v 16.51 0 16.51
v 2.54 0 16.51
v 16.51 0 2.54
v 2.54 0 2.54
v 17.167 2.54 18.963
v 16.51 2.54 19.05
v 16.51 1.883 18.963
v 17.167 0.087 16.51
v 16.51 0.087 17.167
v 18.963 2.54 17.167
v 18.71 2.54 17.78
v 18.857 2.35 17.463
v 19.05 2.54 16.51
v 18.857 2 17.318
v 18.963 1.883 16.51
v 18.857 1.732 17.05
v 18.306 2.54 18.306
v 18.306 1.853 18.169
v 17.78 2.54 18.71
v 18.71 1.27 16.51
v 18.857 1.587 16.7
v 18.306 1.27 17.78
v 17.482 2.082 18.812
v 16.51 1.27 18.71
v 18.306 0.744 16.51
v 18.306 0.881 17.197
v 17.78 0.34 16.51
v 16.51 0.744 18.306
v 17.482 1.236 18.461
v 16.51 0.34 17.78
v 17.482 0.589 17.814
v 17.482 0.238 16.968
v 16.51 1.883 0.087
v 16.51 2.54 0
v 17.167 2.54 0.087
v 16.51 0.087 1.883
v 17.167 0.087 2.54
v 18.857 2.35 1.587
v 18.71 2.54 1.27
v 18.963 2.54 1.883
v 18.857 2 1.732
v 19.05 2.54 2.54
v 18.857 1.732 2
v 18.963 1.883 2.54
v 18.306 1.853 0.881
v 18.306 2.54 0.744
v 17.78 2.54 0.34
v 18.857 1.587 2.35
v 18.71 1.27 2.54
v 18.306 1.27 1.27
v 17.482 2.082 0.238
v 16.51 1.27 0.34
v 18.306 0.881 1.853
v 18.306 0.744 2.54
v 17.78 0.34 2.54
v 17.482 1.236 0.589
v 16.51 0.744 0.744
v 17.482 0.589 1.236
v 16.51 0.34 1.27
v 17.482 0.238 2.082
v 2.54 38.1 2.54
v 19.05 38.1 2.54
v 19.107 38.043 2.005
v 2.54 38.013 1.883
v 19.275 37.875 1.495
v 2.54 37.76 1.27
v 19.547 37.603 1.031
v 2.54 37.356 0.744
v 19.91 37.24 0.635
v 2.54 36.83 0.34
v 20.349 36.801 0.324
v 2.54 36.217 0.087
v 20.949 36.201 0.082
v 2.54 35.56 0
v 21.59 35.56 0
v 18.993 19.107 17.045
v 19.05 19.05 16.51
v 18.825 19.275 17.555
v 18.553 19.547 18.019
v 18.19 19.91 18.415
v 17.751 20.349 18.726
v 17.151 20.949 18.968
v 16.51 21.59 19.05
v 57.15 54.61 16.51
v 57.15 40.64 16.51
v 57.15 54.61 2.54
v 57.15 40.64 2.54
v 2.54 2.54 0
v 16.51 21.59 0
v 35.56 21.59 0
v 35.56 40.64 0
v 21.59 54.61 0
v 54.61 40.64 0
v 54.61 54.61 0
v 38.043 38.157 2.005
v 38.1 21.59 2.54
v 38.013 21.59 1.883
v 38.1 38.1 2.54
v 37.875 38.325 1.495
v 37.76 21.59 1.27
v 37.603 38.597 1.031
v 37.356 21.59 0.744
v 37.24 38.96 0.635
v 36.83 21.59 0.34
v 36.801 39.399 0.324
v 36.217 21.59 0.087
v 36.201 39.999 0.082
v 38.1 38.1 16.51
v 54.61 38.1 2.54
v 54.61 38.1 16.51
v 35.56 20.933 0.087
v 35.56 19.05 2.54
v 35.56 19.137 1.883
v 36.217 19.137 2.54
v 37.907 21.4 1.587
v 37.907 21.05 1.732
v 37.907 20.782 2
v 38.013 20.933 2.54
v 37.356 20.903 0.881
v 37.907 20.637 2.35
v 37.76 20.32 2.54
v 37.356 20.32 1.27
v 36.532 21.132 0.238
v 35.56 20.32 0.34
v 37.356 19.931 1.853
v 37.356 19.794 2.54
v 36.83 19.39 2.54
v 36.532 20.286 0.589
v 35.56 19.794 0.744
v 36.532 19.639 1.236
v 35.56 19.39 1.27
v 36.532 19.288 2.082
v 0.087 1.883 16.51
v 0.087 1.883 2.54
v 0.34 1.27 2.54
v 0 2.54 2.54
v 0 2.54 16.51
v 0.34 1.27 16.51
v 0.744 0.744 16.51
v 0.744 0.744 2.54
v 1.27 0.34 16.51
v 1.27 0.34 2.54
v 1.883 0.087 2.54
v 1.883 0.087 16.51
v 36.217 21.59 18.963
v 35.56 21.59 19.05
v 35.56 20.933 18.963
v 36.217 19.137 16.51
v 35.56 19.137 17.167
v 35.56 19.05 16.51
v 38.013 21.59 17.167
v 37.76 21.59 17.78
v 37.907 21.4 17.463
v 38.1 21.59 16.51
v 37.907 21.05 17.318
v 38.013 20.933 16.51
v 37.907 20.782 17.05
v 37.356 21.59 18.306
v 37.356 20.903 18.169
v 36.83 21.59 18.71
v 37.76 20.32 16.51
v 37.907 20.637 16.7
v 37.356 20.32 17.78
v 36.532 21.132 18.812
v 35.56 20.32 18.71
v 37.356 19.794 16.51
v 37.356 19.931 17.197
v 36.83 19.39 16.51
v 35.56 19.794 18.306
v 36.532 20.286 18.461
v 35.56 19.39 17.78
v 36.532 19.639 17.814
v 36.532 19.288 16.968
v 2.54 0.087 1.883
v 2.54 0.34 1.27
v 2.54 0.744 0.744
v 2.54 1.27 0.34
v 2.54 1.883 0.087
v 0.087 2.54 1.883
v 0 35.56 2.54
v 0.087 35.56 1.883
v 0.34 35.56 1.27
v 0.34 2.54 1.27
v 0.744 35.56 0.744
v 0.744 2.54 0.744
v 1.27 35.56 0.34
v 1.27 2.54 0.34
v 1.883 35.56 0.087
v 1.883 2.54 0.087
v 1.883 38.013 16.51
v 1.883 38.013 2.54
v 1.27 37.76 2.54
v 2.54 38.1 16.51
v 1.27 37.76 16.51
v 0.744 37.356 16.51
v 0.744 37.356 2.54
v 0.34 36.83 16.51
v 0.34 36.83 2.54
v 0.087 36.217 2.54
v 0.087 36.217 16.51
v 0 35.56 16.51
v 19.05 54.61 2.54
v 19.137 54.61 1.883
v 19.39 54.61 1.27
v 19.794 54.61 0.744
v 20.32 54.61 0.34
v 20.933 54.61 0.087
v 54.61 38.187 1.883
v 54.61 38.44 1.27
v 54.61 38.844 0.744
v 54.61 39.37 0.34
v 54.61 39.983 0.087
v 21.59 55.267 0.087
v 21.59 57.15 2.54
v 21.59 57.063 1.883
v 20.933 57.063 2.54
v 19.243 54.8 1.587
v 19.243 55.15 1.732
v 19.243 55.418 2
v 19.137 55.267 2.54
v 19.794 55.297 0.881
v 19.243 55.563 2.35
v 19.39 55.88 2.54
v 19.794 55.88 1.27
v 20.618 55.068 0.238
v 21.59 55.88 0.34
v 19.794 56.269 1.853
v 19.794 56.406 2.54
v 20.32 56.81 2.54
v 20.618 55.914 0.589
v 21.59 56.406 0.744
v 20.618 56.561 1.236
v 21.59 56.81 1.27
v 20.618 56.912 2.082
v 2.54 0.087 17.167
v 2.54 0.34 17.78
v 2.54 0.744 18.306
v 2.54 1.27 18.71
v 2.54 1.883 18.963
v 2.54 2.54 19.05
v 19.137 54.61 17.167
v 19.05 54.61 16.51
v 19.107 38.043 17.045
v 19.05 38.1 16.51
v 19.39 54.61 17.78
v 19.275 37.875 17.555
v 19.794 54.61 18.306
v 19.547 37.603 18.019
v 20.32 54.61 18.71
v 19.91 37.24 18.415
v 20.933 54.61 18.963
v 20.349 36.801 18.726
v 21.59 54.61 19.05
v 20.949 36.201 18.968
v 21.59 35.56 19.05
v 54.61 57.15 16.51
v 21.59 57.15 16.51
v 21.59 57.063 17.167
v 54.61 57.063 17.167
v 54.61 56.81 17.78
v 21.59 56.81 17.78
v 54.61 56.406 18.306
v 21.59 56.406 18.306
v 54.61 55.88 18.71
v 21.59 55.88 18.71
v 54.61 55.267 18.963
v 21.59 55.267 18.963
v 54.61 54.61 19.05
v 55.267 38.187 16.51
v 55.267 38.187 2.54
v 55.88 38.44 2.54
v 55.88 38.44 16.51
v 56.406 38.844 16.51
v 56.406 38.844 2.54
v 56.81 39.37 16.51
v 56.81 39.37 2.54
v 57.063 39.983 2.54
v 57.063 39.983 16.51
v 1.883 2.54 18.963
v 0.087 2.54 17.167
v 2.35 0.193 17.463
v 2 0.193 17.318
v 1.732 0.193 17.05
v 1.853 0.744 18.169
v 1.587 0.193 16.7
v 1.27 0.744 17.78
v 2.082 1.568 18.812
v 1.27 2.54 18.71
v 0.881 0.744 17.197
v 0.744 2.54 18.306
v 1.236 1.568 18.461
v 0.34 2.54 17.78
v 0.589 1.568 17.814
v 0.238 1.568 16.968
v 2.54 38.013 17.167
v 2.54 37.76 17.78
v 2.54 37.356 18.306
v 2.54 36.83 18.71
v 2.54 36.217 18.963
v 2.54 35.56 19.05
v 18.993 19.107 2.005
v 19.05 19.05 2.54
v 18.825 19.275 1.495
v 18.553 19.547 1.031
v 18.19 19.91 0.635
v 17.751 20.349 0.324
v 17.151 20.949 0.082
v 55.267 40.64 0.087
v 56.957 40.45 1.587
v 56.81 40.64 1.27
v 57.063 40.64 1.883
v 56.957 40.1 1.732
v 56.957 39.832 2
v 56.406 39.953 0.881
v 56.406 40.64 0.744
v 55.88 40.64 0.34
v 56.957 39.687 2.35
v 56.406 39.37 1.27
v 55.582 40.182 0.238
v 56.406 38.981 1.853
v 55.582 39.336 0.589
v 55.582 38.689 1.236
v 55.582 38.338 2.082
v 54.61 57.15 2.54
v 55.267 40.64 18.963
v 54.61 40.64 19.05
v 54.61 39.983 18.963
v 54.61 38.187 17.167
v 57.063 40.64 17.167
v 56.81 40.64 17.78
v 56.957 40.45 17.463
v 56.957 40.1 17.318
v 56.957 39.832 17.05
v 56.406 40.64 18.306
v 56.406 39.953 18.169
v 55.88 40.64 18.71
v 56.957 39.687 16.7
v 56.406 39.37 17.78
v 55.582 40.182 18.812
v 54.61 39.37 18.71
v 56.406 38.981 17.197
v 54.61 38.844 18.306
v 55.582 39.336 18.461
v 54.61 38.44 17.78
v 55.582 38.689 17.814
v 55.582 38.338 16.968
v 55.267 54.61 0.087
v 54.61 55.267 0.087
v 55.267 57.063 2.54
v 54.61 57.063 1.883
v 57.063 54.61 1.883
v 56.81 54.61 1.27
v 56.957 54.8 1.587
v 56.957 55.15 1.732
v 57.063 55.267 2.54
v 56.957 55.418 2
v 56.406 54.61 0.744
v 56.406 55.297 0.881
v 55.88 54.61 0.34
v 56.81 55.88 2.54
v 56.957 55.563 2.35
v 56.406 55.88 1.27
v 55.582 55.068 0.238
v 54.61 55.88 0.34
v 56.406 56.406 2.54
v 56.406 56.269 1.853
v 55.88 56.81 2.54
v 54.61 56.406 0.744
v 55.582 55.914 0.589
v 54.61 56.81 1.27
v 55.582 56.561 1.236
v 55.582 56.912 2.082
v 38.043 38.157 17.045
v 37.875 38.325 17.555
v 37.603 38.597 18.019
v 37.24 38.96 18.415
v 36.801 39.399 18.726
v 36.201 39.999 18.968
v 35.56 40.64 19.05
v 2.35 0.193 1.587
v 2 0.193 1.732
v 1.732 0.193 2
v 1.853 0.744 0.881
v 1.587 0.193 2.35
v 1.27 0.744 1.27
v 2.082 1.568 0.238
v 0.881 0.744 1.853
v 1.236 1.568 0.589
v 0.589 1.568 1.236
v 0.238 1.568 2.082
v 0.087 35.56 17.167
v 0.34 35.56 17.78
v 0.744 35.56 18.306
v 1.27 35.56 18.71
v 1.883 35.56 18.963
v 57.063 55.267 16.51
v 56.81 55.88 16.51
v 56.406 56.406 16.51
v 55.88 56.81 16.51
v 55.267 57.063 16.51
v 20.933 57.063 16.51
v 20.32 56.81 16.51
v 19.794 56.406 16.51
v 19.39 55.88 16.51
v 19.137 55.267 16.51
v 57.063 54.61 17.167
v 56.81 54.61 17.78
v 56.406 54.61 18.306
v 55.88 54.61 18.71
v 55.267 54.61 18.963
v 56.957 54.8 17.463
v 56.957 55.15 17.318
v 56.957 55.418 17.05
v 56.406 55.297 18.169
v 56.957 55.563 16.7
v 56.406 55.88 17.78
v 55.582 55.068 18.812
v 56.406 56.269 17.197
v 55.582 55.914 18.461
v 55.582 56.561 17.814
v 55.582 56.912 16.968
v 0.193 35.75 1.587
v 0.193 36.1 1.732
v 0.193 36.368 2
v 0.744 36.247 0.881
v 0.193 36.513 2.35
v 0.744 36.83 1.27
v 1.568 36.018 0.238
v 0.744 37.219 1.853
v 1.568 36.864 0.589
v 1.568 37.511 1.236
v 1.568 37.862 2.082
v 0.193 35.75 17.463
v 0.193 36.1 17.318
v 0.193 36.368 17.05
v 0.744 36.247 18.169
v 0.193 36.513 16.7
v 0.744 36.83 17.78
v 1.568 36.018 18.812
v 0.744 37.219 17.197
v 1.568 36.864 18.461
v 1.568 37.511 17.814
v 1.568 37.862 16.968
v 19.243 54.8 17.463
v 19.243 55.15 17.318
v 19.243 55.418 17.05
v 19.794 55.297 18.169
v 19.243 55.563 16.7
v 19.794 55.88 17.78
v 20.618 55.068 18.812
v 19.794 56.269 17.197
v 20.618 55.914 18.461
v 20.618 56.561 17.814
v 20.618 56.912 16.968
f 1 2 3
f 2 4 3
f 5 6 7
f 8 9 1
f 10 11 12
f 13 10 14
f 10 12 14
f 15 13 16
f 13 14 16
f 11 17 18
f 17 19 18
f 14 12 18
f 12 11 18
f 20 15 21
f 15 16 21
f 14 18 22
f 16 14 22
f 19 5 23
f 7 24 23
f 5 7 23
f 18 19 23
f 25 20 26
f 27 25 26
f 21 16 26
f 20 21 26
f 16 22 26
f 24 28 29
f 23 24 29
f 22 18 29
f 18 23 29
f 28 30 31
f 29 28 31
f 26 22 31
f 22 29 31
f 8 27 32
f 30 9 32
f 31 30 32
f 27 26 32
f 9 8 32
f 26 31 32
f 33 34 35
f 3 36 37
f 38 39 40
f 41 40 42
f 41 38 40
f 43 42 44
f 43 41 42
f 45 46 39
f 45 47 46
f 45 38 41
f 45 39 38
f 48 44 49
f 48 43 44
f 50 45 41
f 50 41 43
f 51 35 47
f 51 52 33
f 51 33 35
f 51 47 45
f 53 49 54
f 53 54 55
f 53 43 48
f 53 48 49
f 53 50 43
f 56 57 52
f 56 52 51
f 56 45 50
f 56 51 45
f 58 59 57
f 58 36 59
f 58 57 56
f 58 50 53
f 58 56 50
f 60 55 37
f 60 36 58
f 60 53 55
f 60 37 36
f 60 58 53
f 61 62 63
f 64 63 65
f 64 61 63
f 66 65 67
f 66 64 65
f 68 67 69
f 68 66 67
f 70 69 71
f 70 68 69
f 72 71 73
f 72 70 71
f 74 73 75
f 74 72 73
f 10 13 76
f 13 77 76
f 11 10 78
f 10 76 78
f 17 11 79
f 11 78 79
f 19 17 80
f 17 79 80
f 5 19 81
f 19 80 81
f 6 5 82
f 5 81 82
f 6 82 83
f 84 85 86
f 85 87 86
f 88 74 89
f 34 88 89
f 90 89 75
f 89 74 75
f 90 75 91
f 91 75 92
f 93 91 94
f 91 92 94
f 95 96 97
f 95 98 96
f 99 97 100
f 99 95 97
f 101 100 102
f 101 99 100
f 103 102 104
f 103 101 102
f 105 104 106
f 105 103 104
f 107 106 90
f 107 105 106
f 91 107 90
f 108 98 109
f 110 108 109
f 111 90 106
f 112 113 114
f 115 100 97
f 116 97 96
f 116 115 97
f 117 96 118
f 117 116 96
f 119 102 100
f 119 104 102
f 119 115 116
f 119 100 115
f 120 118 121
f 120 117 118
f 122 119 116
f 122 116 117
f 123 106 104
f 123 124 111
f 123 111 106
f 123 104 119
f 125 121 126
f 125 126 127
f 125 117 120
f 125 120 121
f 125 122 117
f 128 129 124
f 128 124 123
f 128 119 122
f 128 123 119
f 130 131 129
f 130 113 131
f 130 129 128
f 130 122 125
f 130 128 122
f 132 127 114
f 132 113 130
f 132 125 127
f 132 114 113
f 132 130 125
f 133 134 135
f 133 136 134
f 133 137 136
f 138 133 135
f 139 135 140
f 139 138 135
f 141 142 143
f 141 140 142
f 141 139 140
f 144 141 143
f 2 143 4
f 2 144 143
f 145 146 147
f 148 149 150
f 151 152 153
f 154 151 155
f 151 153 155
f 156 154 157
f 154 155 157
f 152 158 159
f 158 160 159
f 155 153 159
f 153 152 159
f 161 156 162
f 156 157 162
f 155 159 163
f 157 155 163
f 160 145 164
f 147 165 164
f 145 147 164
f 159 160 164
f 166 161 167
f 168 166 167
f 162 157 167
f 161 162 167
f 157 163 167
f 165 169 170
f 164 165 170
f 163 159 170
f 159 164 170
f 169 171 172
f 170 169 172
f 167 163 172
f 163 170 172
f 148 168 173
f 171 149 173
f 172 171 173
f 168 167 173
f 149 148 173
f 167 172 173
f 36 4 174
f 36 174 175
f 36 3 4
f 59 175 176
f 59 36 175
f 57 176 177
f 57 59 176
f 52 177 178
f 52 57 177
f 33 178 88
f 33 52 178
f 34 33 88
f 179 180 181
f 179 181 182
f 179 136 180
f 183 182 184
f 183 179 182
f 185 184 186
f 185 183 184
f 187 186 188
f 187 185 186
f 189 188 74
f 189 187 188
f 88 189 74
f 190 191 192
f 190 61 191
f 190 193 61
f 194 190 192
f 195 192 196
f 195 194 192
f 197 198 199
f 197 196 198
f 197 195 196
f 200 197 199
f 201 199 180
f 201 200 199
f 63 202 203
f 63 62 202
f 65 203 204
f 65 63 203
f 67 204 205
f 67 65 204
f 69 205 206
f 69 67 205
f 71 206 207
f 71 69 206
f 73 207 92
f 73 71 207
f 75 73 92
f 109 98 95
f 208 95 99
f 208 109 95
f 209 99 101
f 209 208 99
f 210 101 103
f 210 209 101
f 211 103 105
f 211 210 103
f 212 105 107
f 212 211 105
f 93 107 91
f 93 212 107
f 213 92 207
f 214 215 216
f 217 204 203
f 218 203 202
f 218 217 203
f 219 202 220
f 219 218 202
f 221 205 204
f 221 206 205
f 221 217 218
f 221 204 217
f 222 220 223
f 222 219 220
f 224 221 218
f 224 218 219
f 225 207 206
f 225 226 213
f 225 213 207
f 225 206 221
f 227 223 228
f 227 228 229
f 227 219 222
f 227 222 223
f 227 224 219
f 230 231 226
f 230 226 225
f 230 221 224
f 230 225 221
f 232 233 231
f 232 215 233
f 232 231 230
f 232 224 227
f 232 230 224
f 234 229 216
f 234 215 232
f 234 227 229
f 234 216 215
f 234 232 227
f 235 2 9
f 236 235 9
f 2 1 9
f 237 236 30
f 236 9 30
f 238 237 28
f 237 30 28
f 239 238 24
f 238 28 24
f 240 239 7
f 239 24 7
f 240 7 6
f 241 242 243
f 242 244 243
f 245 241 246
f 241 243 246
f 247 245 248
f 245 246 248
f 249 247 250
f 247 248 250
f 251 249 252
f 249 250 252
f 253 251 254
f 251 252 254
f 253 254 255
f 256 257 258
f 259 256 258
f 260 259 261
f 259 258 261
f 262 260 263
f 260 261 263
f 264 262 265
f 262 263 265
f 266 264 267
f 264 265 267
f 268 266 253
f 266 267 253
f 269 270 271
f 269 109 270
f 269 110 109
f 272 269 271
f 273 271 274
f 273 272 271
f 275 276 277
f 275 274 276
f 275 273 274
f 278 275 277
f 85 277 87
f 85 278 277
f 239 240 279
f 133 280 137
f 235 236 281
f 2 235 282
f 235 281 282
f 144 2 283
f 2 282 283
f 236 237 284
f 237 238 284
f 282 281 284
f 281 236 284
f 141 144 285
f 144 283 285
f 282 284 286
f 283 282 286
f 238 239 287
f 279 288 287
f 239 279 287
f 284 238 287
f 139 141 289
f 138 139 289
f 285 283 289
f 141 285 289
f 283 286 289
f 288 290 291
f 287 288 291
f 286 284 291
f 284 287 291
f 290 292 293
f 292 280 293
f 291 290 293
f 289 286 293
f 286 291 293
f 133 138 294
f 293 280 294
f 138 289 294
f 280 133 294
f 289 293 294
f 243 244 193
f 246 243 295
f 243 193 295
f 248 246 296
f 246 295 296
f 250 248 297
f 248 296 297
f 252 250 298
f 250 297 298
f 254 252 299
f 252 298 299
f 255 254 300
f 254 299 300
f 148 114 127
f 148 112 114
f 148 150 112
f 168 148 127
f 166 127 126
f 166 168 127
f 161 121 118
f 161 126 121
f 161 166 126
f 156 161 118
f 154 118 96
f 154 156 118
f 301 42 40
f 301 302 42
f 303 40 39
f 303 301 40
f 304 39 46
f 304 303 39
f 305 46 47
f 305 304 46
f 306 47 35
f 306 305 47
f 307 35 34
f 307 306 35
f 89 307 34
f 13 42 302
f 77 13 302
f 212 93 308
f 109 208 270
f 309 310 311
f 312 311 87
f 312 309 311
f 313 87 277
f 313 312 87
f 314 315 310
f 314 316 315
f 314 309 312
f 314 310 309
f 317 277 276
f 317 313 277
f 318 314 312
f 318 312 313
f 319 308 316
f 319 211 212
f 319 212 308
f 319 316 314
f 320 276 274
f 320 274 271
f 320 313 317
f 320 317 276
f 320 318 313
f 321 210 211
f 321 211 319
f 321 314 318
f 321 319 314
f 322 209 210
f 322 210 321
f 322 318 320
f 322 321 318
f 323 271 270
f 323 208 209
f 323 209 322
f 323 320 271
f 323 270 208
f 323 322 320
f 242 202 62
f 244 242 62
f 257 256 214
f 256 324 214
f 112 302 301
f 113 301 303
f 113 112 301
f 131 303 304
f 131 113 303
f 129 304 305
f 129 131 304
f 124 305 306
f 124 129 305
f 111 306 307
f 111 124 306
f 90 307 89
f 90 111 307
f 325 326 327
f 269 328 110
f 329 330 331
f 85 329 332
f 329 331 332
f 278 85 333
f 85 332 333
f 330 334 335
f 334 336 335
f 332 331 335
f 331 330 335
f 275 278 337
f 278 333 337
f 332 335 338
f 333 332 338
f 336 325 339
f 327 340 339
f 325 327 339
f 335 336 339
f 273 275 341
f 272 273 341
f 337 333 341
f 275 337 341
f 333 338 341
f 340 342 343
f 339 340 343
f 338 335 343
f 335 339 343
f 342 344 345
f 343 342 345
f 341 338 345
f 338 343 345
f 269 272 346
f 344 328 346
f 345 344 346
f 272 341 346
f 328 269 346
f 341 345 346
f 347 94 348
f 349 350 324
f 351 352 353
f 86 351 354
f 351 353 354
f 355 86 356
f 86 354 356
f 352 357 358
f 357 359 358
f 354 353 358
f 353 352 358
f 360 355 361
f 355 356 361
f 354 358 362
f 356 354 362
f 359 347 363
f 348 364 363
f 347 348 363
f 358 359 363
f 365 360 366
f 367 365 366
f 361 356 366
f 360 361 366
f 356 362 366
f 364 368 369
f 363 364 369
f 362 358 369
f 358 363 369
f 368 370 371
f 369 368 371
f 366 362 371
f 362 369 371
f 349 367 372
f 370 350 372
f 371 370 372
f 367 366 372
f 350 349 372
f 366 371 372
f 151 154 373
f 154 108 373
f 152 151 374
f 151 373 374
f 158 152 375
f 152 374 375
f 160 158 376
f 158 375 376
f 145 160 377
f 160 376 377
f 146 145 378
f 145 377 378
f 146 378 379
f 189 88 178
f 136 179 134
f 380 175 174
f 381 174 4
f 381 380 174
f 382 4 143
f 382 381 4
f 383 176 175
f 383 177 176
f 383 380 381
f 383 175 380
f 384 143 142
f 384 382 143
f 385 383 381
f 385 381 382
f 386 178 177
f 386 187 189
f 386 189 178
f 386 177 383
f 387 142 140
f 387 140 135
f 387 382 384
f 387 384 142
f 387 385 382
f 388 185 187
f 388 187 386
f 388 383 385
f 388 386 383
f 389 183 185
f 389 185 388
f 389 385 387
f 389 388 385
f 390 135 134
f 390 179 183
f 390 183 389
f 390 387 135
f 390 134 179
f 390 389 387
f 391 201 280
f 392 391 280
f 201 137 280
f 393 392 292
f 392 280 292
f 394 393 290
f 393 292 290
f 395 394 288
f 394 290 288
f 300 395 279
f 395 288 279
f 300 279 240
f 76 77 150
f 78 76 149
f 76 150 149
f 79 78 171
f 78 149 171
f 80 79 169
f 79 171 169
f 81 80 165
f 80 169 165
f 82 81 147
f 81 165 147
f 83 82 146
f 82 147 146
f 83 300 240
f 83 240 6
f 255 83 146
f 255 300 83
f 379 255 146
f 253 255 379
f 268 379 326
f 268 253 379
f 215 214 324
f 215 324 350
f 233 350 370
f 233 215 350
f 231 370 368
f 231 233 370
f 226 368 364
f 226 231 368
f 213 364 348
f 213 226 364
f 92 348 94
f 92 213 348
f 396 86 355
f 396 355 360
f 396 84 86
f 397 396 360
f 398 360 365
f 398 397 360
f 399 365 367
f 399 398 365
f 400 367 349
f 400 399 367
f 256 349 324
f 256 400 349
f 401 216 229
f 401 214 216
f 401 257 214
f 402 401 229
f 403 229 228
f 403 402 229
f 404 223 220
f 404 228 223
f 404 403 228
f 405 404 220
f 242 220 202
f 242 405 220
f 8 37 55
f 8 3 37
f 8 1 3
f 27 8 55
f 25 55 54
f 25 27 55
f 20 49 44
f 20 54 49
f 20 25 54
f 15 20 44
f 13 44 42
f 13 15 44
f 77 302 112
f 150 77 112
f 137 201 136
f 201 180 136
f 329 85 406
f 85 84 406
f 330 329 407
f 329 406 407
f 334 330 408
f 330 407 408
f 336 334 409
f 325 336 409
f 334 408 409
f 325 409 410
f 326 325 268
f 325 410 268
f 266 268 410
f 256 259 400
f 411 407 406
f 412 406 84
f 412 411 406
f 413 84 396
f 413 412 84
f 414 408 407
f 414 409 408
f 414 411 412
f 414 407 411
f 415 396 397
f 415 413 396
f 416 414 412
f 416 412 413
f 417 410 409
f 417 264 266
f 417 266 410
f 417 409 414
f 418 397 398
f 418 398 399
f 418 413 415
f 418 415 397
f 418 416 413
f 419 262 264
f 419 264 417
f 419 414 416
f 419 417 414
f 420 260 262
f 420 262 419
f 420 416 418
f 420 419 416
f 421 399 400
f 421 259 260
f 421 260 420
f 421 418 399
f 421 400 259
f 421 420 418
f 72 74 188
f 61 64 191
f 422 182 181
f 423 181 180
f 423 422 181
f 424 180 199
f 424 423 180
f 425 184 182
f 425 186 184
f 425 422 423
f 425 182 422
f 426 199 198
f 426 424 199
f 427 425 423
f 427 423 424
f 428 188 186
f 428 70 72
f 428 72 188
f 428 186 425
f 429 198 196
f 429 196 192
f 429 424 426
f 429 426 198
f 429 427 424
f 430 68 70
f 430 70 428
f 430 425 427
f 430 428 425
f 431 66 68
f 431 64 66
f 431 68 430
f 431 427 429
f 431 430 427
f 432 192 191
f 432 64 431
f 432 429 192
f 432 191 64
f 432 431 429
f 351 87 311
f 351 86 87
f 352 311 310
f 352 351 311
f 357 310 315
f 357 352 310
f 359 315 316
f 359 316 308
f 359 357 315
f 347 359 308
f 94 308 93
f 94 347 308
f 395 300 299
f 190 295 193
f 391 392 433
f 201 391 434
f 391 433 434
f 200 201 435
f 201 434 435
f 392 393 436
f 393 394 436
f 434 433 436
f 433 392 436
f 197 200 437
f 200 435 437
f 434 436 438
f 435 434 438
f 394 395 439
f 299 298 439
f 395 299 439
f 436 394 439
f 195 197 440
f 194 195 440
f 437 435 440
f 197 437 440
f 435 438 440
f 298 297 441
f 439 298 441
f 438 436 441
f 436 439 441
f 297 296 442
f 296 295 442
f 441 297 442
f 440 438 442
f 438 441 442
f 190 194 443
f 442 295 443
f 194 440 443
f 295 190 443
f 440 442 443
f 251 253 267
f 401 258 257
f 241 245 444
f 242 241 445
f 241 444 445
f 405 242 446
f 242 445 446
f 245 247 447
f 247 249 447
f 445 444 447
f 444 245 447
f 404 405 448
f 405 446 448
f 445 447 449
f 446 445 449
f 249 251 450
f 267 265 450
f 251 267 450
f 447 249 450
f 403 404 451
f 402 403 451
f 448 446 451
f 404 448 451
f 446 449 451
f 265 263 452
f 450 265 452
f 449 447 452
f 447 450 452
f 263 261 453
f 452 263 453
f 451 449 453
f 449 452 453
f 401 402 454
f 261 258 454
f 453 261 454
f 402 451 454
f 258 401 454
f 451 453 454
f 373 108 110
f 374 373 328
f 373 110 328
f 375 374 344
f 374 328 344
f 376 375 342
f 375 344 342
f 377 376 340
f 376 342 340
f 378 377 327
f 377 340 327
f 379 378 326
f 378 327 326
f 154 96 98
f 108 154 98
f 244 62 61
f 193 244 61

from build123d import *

# Parameters (mm, degrees)
F1_DEPTH = 19.05
F2_R     = 2.54


with BuildPart() as f1:
    # F0 (on Top) → F1 (new body)
    with BuildSketch(Plane.XY):
        Polygon((19.05, 38.1), (0, 38.1), (0, 0), (19.05, 0), (19.05, 19.05), (38.1, 19.05), (38.1, 38.1), (57.15, 38.1), (57.15, 57.15), (19.05, 57.15), align=None)
    extrude(amount=F1_DEPTH)

    # F2
    f2_edges = [f1.edges().sort_by_distance(p)[0] for p in [
        (38.1, 57.15, 19.05),
        (19.05, 47.625, 19.05),
        (9.525, 38.1, 19.05),
        (0, 19.05, 19.05),
        (9.525, 0, 19.05),
        (19.05, 9.525, 19.05),
        (28.575, 19.05, 19.05),
        (38.1, 28.575, 19.05),
        (47.625, 38.1, 19.05),
        (57.15, 47.625, 19.05),
        (38.1, 57.15, 0),
        (19.05, 47.625, 0),
        (9.525, 38.1, 0),
        (0, 19.05, 0),
        (9.525, 0, 0),
        (19.05, 9.525, 0),
        (28.575, 19.05, 0),
        (38.1, 28.575, 0),
        (47.625, 38.1, 0),
        (57.15, 47.625, 0),
        (0, 0, 9.525),
        (19.05, 0, 9.525),
        (57.15, 38.1, 9.525),
        (57.15, 57.15, 9.525),
        (38.1, 19.05, 9.525),
        (19.05, 57.15, 9.525),
        (0, 38.1, 9.525),
    ]]
    fillet(f2_edges, radius=F2_R)


solid = f1.part
